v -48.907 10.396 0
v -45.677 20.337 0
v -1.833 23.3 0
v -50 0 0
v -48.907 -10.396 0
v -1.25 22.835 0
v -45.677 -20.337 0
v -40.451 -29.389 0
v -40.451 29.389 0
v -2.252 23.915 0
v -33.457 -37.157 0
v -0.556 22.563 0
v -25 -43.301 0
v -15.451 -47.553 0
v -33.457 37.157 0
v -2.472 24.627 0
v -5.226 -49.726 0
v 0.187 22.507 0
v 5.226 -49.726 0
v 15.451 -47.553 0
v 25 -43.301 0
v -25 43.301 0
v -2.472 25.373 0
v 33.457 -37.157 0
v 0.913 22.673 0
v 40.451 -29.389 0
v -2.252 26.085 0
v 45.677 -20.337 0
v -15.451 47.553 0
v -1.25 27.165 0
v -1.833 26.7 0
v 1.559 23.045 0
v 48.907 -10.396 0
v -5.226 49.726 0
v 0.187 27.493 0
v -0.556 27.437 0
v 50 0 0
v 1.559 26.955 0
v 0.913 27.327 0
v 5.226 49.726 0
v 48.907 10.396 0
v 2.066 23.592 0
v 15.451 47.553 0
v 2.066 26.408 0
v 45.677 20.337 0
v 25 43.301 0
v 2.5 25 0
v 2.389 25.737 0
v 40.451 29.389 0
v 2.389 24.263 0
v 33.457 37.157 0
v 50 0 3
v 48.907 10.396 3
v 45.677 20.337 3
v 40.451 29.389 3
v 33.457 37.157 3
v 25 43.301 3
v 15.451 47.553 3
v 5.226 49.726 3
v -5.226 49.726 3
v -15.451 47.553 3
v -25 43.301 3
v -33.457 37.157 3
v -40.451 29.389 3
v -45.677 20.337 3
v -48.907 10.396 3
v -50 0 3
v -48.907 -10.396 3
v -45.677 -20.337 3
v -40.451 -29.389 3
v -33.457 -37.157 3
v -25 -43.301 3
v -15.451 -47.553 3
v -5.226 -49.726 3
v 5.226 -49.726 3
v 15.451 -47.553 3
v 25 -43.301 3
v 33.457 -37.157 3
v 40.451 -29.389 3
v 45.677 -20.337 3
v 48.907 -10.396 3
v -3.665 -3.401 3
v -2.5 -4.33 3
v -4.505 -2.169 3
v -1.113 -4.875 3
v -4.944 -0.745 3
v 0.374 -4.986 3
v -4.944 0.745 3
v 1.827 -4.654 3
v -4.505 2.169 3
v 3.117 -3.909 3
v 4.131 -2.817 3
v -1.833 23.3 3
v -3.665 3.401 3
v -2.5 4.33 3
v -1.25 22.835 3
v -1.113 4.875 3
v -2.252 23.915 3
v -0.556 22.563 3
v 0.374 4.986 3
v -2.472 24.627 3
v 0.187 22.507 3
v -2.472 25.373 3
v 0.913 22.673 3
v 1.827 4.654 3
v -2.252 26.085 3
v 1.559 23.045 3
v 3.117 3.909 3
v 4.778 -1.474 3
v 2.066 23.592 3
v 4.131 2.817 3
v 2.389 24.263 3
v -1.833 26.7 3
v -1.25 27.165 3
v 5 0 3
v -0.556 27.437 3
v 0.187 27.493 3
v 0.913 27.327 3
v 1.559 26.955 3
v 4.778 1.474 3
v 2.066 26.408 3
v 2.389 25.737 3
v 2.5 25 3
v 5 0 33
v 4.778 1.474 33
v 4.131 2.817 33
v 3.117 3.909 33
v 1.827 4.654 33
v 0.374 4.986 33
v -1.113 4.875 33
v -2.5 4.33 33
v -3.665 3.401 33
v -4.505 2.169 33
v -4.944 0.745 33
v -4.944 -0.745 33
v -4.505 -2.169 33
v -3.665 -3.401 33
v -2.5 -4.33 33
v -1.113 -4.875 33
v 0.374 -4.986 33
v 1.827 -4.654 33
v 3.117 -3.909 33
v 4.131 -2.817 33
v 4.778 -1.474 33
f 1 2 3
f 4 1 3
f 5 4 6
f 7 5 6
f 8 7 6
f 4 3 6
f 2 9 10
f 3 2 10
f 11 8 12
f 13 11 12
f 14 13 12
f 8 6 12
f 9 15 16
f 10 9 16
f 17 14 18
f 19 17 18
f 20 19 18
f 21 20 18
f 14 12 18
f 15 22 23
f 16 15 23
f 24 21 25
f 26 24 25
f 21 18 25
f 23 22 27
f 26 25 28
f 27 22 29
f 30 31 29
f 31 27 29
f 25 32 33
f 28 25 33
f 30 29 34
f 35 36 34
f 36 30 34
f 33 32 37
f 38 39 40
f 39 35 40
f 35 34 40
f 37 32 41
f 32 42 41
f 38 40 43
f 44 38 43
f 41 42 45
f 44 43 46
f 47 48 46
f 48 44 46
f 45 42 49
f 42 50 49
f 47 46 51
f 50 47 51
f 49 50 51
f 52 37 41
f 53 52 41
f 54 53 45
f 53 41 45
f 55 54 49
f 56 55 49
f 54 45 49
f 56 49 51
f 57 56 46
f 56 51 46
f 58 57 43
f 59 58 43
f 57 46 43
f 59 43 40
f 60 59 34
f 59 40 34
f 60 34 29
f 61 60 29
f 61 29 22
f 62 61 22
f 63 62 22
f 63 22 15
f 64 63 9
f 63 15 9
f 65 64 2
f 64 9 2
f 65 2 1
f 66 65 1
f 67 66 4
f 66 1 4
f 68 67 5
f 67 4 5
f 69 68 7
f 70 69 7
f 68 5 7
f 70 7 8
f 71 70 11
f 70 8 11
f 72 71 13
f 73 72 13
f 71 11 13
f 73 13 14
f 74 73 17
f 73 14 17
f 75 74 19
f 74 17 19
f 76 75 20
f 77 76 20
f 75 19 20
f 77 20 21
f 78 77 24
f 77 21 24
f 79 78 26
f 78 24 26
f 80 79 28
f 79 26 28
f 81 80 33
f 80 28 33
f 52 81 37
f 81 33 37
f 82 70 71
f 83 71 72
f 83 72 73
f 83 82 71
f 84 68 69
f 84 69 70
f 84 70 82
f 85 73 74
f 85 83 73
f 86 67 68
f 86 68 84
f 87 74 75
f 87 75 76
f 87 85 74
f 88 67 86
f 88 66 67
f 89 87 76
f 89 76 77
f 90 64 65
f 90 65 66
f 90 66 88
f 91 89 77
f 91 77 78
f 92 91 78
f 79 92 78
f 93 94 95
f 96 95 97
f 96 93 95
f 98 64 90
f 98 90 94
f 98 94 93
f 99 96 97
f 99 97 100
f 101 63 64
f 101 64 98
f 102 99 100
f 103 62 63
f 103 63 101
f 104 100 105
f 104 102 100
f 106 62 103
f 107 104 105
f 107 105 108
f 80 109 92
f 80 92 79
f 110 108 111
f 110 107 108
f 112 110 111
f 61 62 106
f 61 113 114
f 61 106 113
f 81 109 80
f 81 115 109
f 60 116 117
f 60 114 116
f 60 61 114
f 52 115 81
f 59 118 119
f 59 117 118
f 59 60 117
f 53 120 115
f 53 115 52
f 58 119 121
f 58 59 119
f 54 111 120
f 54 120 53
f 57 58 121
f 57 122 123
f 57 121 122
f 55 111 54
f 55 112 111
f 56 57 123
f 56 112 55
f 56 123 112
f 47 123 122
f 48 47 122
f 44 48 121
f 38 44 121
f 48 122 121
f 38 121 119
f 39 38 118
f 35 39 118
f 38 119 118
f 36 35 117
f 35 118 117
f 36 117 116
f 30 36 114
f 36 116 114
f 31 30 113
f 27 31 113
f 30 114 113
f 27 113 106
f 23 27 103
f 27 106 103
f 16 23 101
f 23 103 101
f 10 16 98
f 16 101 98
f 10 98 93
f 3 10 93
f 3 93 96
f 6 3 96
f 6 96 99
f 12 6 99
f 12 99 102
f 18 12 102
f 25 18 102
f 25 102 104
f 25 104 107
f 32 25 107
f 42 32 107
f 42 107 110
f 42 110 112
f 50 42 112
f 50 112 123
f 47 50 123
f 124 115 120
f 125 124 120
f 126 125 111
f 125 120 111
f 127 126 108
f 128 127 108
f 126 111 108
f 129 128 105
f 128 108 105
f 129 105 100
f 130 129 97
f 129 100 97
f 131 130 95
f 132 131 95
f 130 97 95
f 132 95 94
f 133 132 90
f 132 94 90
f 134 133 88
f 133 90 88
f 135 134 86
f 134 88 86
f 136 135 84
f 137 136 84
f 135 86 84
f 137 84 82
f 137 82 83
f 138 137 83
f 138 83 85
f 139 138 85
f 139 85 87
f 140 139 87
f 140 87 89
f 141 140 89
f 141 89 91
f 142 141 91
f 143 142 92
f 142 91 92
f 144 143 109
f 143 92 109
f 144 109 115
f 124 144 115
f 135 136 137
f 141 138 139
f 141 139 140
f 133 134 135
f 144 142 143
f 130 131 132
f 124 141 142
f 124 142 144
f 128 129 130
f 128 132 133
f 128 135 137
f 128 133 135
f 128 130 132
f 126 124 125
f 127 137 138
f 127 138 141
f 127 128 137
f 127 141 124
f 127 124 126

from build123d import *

# Parameters (mm, degrees)
SKETCH_1_R          = 50
EXTRUDE_1_DEPTH     = 3
SKETCH_2_R          = 5
EXTRUDE_2_DEPTH     = 30
SKETCH_3_R          = 2.5
CUT_EXTRUDE_1_DEPTH = 77.811457479


with BuildPart() as part:
    # Эскиз1 → Бобышка-Вытянуть1 (new body)
    with BuildSketch(Plane.XY):
        Circle(SKETCH_1_R)
    extrude(amount=EXTRUDE_1_DEPTH)

    # Эскиз2 → Бобышка-Вытянуть2 (add)
    with BuildSketch(Plane.XY.offset(3)):
        Circle(SKETCH_2_R)
    extrude(amount=EXTRUDE_2_DEPTH)

    # Эскиз3 → Вырез-Вытянуть1 (cut, through all)
    with BuildSketch(Plane.XY.offset(3)):
        with Locations((0, 25)):
            Circle(SKETCH_3_R)
    extrude(amount=-CUT_EXTRUDE_1_DEPTH, mode=Mode.SUBTRACT)


solid = part.part
